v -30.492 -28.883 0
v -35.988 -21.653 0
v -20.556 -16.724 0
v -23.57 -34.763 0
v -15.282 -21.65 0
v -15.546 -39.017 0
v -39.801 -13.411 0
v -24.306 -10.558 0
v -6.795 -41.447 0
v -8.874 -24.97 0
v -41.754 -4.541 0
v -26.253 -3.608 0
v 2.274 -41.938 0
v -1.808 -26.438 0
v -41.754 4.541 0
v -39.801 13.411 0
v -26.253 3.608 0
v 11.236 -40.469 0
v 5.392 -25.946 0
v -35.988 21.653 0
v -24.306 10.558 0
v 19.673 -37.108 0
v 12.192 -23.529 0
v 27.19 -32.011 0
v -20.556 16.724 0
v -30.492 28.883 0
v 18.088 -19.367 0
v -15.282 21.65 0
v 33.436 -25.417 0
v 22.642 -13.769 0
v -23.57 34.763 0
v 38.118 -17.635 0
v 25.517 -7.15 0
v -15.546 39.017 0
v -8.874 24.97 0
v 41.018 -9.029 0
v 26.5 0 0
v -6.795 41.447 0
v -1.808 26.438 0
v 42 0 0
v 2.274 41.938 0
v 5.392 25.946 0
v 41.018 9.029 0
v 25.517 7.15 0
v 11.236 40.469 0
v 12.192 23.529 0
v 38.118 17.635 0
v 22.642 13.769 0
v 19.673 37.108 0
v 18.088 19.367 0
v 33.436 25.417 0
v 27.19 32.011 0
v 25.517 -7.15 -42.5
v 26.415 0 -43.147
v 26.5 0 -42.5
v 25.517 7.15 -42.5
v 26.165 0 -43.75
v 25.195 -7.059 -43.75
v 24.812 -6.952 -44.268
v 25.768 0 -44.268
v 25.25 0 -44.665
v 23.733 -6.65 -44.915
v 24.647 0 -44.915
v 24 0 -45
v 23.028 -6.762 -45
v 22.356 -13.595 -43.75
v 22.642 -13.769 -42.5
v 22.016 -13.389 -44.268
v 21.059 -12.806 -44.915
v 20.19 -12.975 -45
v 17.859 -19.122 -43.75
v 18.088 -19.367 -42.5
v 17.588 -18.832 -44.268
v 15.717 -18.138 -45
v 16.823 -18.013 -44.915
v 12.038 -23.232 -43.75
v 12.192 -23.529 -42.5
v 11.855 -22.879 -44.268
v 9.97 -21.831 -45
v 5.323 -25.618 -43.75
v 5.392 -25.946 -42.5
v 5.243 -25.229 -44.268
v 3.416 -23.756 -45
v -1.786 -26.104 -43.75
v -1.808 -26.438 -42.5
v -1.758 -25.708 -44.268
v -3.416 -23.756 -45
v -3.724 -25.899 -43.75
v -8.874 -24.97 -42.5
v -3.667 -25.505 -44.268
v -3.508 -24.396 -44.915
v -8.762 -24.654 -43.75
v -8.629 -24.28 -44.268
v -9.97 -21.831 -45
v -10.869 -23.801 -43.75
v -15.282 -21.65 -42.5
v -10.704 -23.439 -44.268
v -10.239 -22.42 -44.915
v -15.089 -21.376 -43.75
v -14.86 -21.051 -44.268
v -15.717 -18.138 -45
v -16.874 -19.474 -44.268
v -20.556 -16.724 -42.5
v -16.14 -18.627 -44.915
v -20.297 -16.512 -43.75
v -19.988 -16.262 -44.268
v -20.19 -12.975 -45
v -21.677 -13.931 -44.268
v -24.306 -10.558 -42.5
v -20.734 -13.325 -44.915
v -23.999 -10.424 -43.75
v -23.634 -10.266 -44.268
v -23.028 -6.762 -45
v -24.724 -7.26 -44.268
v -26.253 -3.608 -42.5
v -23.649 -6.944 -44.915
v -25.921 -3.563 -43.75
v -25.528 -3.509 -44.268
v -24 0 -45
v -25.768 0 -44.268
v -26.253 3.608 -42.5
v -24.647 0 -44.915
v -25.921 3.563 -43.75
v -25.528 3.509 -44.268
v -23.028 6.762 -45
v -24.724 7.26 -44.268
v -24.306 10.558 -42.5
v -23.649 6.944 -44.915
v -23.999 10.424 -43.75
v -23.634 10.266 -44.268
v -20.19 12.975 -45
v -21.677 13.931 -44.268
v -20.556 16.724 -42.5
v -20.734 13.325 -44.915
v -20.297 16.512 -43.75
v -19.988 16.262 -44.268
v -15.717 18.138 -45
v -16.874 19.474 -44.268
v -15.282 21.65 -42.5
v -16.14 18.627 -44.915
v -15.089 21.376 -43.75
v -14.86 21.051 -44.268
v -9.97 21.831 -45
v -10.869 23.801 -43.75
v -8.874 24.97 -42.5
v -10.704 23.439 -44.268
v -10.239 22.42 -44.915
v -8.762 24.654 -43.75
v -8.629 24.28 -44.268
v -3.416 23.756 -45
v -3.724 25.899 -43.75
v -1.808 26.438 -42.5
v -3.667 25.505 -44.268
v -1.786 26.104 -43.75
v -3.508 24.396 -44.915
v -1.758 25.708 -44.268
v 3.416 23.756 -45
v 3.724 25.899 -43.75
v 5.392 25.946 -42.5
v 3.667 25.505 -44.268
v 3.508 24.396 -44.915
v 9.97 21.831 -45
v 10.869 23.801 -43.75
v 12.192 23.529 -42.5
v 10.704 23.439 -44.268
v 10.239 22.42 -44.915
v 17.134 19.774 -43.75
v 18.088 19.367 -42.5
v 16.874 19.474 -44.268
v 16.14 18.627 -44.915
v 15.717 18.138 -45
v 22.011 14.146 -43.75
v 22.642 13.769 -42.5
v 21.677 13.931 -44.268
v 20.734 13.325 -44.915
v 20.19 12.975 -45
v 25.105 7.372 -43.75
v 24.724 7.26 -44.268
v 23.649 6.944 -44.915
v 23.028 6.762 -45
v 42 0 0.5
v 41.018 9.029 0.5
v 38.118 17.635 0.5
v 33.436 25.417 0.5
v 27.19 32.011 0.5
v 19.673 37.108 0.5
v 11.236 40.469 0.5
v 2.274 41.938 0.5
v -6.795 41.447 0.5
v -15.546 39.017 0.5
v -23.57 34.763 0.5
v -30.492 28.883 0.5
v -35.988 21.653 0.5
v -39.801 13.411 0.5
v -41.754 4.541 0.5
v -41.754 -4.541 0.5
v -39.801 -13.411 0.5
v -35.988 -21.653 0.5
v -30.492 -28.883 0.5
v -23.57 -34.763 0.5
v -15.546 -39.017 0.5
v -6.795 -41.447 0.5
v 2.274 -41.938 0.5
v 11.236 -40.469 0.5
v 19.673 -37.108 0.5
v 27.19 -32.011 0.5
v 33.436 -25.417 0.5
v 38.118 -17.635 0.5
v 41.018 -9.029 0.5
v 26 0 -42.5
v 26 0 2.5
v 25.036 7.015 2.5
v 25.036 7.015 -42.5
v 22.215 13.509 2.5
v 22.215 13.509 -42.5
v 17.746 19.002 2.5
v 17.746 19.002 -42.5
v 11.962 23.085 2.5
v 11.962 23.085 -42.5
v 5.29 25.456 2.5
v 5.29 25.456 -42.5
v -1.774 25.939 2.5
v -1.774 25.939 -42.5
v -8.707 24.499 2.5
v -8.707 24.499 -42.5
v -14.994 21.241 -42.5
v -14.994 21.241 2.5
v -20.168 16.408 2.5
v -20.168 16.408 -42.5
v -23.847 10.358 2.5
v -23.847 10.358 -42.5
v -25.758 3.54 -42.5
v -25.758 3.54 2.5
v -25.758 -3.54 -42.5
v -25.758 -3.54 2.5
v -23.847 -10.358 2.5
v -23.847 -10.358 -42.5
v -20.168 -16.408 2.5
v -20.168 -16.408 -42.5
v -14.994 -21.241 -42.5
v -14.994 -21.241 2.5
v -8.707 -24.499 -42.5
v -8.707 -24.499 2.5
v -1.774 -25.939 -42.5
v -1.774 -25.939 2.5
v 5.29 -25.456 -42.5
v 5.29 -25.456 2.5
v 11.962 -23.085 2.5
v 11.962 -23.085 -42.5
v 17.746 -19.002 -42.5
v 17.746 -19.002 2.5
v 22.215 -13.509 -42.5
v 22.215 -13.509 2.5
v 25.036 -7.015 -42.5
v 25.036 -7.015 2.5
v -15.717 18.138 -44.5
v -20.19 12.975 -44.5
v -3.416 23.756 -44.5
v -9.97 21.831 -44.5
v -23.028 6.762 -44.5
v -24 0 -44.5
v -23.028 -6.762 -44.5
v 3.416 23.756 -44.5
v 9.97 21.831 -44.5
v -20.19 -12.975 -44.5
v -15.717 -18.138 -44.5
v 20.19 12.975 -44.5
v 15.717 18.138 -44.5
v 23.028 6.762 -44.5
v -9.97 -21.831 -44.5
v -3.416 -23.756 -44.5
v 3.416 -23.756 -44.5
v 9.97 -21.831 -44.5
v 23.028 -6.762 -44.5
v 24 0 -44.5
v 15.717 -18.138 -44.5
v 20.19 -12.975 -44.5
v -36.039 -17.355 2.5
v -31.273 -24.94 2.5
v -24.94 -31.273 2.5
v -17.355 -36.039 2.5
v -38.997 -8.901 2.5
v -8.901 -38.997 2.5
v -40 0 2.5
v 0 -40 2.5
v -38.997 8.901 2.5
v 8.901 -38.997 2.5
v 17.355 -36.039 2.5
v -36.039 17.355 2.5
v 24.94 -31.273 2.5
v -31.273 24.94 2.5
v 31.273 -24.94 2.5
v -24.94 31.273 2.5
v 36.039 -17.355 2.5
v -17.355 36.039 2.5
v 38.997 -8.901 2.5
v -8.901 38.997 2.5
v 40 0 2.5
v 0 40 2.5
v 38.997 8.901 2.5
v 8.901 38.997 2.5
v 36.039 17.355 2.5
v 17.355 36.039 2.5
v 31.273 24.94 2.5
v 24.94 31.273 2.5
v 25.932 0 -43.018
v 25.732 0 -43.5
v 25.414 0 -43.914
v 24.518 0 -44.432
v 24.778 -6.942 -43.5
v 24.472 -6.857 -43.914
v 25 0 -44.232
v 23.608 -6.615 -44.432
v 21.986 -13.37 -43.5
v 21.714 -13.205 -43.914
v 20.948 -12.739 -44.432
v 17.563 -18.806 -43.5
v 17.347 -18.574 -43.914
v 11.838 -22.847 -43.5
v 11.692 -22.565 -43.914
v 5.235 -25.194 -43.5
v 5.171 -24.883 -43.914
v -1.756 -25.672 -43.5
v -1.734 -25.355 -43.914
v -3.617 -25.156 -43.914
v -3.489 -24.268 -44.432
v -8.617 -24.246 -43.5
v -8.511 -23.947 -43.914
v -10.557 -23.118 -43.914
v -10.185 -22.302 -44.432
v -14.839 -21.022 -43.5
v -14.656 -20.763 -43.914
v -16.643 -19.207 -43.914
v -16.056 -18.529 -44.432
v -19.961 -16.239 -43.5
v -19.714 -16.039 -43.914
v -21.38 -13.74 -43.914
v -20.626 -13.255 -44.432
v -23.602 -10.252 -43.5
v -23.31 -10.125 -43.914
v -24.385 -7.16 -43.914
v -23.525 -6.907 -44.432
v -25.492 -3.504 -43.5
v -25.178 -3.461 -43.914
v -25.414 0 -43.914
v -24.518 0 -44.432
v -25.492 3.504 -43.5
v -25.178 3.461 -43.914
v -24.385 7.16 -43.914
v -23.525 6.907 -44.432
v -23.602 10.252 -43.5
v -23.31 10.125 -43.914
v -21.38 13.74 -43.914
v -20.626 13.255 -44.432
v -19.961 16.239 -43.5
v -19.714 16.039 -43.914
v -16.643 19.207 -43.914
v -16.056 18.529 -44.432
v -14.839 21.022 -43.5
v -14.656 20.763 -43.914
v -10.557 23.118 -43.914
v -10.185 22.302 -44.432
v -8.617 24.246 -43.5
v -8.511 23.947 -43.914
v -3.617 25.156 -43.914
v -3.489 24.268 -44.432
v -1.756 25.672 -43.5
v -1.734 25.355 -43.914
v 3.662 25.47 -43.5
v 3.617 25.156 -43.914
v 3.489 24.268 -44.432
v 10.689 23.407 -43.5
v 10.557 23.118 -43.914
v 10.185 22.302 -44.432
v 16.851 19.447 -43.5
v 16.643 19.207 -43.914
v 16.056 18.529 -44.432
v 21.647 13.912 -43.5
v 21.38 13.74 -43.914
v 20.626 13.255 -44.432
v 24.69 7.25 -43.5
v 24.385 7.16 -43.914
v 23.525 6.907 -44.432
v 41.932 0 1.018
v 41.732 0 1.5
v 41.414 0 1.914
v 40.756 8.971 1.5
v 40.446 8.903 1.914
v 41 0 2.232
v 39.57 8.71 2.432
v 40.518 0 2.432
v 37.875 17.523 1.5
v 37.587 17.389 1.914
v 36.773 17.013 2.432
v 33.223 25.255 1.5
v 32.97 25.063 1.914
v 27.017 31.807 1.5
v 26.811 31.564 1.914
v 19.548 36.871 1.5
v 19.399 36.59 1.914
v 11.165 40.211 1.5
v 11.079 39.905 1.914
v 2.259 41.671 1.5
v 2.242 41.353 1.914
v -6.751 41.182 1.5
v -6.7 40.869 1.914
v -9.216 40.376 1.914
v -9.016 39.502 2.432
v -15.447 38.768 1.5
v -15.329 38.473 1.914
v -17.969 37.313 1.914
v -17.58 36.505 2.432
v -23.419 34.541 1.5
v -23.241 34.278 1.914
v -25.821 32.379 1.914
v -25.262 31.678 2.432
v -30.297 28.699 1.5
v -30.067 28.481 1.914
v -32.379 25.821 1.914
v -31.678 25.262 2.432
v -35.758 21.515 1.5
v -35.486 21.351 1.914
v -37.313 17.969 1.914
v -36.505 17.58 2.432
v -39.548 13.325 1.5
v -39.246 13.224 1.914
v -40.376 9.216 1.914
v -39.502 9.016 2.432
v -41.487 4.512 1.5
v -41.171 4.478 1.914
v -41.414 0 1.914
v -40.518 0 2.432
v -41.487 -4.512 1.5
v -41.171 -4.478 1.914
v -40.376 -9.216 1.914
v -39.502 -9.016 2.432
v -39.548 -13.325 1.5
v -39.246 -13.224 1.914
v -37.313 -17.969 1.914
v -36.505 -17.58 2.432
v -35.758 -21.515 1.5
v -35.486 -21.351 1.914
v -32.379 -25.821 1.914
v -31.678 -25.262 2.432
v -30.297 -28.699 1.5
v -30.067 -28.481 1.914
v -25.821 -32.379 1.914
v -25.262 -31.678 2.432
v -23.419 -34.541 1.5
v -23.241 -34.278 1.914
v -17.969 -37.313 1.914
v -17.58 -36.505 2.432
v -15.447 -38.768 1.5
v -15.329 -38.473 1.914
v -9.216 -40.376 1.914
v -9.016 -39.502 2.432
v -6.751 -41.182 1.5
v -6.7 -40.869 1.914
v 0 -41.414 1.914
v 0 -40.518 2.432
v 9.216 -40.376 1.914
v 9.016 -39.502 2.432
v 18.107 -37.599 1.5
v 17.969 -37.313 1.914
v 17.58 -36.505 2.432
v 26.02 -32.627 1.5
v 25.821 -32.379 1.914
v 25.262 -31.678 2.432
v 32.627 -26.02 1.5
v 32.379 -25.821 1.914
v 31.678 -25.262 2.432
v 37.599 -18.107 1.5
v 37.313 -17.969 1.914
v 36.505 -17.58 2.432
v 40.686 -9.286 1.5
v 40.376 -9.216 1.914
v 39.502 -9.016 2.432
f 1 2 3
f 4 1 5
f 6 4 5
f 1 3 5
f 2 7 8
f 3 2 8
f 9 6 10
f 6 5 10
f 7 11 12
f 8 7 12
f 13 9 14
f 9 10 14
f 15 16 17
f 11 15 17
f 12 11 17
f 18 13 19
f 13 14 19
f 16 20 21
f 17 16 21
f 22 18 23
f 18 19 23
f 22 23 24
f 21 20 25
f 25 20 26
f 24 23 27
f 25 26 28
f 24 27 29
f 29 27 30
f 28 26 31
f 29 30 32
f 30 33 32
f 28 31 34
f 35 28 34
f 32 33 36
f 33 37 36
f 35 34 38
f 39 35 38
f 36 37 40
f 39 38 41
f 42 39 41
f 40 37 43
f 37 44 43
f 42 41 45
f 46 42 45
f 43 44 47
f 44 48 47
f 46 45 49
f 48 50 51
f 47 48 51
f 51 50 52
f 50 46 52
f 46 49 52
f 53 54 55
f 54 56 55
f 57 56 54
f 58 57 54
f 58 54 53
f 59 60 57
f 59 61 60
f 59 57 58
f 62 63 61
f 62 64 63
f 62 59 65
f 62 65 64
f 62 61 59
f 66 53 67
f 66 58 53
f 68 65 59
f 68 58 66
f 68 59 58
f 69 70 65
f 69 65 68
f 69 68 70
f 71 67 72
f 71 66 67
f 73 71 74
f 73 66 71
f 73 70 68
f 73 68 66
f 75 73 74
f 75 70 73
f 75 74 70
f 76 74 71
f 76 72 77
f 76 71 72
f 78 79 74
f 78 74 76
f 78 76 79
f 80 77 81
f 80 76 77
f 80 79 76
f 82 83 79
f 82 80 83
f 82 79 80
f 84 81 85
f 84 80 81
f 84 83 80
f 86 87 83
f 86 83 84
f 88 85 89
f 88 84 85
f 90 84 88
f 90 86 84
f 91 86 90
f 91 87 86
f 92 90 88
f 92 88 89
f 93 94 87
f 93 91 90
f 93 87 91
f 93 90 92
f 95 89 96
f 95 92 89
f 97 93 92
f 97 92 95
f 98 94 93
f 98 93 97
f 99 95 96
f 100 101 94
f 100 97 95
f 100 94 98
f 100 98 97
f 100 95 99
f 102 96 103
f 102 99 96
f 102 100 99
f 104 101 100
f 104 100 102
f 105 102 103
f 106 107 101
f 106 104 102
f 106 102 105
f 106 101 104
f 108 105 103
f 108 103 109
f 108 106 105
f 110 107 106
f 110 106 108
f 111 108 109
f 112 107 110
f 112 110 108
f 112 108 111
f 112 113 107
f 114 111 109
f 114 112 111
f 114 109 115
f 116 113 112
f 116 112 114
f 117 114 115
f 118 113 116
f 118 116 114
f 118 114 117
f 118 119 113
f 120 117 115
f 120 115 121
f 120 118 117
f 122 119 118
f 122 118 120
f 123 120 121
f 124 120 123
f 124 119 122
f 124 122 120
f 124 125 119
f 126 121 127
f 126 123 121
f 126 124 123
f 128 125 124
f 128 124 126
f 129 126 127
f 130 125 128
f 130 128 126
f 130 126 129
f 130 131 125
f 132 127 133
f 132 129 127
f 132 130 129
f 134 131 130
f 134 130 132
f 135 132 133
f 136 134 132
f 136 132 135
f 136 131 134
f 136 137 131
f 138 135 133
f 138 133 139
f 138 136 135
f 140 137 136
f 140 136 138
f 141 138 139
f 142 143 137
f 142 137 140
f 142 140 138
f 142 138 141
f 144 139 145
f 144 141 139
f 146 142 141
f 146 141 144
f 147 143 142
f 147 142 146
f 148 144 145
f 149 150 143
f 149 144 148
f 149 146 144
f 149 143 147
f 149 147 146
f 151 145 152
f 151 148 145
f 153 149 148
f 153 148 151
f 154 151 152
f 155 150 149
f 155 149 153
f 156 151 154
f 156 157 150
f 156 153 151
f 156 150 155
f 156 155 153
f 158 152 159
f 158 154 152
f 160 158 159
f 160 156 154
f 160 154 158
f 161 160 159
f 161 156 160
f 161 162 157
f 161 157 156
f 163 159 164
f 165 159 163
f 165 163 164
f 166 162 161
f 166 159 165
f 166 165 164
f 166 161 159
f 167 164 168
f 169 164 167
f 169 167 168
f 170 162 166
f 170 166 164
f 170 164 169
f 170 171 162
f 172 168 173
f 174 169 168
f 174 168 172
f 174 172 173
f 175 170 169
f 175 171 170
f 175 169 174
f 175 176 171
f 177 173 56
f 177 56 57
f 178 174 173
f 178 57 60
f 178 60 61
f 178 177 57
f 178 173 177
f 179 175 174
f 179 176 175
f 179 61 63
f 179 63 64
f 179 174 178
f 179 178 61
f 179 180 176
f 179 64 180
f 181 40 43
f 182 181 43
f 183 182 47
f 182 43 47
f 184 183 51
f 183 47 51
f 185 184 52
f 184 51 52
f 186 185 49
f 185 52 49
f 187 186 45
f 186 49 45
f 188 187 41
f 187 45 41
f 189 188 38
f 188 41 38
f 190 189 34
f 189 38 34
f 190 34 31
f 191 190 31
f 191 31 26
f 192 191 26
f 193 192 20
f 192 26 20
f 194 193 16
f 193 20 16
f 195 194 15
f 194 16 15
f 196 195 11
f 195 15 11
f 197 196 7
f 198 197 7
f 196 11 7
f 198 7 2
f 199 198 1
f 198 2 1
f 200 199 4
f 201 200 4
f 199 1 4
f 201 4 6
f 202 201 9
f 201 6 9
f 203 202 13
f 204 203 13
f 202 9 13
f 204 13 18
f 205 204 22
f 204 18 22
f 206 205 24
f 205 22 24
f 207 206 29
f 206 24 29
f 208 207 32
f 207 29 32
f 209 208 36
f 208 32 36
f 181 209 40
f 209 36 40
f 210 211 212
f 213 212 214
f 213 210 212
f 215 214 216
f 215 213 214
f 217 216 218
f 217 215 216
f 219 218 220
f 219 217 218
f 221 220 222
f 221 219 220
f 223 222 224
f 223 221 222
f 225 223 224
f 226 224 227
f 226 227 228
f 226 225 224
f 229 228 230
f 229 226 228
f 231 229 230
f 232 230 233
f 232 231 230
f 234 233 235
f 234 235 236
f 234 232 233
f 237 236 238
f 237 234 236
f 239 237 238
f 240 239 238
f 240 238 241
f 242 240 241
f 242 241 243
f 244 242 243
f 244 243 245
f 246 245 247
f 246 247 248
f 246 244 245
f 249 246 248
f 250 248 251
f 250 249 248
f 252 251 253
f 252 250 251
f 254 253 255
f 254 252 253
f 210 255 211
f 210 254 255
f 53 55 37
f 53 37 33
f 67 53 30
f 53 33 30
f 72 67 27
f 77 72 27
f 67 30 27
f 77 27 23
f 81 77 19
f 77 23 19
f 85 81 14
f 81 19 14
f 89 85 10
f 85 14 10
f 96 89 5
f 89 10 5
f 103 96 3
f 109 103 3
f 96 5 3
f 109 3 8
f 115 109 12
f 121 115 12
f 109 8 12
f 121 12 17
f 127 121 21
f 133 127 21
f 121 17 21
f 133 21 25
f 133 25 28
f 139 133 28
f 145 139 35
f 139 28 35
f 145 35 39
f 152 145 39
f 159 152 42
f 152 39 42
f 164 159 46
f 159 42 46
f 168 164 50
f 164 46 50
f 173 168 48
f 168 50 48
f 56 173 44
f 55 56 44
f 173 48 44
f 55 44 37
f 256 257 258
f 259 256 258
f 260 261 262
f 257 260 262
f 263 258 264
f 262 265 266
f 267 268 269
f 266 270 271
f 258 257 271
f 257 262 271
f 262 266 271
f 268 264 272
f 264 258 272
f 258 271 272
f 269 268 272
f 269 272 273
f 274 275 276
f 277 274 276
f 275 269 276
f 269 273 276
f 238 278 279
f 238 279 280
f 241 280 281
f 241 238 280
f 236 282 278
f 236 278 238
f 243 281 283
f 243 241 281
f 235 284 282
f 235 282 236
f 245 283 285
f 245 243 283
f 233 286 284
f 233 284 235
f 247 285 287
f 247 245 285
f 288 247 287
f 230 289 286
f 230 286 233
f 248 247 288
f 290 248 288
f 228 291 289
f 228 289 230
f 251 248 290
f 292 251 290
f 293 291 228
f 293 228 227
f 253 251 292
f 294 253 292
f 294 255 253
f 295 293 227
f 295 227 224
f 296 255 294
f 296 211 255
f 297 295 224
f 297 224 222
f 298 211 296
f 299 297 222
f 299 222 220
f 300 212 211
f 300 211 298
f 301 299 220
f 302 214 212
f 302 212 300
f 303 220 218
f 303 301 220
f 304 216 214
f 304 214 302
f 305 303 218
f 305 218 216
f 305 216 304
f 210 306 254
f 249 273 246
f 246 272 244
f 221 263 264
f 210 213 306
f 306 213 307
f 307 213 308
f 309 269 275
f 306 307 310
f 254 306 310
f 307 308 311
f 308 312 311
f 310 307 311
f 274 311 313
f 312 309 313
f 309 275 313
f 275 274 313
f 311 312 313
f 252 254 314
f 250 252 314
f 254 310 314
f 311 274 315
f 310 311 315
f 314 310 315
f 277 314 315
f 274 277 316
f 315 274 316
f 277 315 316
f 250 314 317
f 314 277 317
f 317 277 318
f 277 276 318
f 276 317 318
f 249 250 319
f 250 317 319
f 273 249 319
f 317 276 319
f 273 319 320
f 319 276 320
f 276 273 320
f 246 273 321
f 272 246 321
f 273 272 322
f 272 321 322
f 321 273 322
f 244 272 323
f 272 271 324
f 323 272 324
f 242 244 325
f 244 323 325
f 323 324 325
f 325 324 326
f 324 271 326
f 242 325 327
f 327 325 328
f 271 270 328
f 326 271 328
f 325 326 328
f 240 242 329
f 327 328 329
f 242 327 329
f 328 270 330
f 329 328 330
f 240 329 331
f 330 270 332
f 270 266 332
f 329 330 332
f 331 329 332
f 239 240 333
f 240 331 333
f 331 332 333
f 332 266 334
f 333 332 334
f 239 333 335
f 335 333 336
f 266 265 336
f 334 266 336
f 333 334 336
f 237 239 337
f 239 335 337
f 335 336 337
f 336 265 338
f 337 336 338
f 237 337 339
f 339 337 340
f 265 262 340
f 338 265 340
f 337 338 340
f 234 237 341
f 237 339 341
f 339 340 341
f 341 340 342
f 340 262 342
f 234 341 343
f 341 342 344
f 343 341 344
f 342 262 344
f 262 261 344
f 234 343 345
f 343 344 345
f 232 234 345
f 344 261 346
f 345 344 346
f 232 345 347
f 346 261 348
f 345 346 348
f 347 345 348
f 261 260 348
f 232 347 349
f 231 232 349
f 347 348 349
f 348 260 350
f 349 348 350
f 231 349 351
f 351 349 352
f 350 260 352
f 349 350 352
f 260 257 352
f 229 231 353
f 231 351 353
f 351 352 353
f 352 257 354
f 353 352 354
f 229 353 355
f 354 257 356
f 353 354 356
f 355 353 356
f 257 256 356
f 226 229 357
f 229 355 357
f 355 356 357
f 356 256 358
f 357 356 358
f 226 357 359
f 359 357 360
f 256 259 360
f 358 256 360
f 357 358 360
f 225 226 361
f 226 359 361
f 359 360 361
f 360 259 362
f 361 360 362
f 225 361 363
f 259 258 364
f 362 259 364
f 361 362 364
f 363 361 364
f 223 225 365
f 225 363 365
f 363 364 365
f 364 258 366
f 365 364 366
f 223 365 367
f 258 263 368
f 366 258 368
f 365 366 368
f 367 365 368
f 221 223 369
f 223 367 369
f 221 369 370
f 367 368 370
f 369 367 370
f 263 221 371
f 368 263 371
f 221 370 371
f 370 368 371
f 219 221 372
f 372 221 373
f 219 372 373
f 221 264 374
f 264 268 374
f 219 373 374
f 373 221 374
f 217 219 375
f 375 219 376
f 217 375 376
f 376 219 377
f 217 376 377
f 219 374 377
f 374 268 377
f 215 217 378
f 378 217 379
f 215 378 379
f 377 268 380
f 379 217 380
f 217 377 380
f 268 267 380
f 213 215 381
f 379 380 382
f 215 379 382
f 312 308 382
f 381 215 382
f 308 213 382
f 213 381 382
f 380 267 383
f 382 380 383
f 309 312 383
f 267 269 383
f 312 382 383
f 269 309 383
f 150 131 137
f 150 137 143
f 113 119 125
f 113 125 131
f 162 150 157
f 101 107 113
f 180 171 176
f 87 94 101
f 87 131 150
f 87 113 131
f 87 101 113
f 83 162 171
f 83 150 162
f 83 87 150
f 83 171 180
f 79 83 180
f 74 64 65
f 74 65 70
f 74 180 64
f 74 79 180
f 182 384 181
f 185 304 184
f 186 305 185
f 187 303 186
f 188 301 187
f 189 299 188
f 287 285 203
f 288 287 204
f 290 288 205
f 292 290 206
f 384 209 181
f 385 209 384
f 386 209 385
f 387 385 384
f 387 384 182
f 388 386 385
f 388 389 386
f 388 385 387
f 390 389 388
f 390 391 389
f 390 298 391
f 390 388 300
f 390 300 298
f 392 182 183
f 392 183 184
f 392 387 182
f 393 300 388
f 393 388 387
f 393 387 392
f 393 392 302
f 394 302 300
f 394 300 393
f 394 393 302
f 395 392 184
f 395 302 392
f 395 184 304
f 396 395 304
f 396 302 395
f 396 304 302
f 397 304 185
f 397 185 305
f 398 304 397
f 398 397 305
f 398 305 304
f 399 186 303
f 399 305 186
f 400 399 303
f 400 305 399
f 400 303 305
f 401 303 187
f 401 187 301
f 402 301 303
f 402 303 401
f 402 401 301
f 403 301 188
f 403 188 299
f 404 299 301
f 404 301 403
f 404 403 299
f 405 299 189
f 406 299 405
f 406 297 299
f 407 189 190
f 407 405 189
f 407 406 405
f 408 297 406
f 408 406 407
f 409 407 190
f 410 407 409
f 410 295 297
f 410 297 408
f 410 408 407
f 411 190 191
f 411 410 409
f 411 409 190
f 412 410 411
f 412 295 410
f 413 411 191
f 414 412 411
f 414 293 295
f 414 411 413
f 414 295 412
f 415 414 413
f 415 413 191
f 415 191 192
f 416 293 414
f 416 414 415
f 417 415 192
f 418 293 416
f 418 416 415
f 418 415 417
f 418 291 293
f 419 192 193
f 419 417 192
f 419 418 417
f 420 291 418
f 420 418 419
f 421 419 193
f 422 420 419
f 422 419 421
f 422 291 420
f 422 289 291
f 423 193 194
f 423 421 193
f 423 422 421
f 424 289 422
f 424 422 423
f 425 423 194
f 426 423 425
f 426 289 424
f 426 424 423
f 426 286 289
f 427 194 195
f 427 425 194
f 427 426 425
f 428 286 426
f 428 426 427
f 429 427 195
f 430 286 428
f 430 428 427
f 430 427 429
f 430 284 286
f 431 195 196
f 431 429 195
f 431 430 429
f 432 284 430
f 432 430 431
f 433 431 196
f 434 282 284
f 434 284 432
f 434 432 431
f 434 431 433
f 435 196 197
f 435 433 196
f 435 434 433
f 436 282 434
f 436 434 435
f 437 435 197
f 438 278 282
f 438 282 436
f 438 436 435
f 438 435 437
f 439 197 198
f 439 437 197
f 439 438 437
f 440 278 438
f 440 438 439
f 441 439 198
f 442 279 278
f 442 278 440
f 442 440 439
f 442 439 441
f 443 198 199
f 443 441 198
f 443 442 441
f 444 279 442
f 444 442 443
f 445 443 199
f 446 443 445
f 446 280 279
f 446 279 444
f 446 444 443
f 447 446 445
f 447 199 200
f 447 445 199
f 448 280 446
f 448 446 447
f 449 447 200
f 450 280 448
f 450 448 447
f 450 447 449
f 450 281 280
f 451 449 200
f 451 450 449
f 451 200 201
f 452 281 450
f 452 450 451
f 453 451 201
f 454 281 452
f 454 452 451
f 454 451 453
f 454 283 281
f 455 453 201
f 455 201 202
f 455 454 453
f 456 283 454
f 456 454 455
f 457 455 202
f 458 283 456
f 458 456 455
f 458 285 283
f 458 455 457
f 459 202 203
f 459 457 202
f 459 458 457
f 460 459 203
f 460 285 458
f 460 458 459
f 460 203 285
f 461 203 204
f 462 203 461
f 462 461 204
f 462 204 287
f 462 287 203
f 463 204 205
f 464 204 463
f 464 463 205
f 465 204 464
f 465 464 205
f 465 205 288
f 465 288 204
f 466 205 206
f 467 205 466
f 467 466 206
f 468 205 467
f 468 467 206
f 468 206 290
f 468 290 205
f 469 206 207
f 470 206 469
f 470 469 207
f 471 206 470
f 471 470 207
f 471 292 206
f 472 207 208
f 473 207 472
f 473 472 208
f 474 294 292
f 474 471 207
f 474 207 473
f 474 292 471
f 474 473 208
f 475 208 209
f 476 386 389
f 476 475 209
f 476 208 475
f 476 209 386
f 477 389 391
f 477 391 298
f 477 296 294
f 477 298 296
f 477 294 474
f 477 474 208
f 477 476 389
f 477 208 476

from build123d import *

# Parameters (mm, degrees)
F0_R     = 42
F0_R_2   = 26
F1_DEPTH = 2.5
F2_R     = 2
F3_R     = 26.5
F4_DEPTH = 45
F5_R     = 2.5
F6_T     = -0.5


# Not quite as in the source:
# - a shell that OpenCascade refuses in one call is made with other operations: the cavity is built on its own and cut out


with BuildPart() as f1:
    # F0 (on Top) → F1 (new body)
    with BuildSketch(Plane.XY):
        Circle(F0_R)
        Circle(F0_R_2, mode=Mode.SUBTRACT)
    extrude(amount=F1_DEPTH)

    # F2
    f2_edges = [f1.edges().sort_by_distance(p)[0] for p in [
        (-42, 0, 2.5),
    ]]
    fillet(f2_edges, radius=F2_R)

    # F3 (on face) → F4 (join)
    with BuildSketch(Plane(origin=(0, 0, 0), x_dir=(1, 0, 0), z_dir=(0, 0, -1))):
        Circle(F3_R)
    extrude(amount=F4_DEPTH)

    # F5
    f5_edges = [f1.edges().sort_by_distance(p)[0] for p in [
        (-26.5, 0, -45),
    ]]
    fillet(f5_edges, radius=F5_R)

    # F6: a shell. OpenCascade refuses it in one call, so the cavity is built on its own and cut out:
    # the body offset inwards by the wall thickness, plus a prism from it out through each open face.
    f6_core = offset(f1.part, amount=F6_T, kind=Kind.INTERSECTION, mode=Mode.PRIVATE)
    f6_exits = [f6_core.faces().sort_by_distance(p)[0] for p in [
        (0, 0, -0.5),
    ]]
    add(f6_core, mode=Mode.SUBTRACT)
    extrude(f6_exits, amount=-F6_T, mode=Mode.SUBTRACT)


solid = f1.part
